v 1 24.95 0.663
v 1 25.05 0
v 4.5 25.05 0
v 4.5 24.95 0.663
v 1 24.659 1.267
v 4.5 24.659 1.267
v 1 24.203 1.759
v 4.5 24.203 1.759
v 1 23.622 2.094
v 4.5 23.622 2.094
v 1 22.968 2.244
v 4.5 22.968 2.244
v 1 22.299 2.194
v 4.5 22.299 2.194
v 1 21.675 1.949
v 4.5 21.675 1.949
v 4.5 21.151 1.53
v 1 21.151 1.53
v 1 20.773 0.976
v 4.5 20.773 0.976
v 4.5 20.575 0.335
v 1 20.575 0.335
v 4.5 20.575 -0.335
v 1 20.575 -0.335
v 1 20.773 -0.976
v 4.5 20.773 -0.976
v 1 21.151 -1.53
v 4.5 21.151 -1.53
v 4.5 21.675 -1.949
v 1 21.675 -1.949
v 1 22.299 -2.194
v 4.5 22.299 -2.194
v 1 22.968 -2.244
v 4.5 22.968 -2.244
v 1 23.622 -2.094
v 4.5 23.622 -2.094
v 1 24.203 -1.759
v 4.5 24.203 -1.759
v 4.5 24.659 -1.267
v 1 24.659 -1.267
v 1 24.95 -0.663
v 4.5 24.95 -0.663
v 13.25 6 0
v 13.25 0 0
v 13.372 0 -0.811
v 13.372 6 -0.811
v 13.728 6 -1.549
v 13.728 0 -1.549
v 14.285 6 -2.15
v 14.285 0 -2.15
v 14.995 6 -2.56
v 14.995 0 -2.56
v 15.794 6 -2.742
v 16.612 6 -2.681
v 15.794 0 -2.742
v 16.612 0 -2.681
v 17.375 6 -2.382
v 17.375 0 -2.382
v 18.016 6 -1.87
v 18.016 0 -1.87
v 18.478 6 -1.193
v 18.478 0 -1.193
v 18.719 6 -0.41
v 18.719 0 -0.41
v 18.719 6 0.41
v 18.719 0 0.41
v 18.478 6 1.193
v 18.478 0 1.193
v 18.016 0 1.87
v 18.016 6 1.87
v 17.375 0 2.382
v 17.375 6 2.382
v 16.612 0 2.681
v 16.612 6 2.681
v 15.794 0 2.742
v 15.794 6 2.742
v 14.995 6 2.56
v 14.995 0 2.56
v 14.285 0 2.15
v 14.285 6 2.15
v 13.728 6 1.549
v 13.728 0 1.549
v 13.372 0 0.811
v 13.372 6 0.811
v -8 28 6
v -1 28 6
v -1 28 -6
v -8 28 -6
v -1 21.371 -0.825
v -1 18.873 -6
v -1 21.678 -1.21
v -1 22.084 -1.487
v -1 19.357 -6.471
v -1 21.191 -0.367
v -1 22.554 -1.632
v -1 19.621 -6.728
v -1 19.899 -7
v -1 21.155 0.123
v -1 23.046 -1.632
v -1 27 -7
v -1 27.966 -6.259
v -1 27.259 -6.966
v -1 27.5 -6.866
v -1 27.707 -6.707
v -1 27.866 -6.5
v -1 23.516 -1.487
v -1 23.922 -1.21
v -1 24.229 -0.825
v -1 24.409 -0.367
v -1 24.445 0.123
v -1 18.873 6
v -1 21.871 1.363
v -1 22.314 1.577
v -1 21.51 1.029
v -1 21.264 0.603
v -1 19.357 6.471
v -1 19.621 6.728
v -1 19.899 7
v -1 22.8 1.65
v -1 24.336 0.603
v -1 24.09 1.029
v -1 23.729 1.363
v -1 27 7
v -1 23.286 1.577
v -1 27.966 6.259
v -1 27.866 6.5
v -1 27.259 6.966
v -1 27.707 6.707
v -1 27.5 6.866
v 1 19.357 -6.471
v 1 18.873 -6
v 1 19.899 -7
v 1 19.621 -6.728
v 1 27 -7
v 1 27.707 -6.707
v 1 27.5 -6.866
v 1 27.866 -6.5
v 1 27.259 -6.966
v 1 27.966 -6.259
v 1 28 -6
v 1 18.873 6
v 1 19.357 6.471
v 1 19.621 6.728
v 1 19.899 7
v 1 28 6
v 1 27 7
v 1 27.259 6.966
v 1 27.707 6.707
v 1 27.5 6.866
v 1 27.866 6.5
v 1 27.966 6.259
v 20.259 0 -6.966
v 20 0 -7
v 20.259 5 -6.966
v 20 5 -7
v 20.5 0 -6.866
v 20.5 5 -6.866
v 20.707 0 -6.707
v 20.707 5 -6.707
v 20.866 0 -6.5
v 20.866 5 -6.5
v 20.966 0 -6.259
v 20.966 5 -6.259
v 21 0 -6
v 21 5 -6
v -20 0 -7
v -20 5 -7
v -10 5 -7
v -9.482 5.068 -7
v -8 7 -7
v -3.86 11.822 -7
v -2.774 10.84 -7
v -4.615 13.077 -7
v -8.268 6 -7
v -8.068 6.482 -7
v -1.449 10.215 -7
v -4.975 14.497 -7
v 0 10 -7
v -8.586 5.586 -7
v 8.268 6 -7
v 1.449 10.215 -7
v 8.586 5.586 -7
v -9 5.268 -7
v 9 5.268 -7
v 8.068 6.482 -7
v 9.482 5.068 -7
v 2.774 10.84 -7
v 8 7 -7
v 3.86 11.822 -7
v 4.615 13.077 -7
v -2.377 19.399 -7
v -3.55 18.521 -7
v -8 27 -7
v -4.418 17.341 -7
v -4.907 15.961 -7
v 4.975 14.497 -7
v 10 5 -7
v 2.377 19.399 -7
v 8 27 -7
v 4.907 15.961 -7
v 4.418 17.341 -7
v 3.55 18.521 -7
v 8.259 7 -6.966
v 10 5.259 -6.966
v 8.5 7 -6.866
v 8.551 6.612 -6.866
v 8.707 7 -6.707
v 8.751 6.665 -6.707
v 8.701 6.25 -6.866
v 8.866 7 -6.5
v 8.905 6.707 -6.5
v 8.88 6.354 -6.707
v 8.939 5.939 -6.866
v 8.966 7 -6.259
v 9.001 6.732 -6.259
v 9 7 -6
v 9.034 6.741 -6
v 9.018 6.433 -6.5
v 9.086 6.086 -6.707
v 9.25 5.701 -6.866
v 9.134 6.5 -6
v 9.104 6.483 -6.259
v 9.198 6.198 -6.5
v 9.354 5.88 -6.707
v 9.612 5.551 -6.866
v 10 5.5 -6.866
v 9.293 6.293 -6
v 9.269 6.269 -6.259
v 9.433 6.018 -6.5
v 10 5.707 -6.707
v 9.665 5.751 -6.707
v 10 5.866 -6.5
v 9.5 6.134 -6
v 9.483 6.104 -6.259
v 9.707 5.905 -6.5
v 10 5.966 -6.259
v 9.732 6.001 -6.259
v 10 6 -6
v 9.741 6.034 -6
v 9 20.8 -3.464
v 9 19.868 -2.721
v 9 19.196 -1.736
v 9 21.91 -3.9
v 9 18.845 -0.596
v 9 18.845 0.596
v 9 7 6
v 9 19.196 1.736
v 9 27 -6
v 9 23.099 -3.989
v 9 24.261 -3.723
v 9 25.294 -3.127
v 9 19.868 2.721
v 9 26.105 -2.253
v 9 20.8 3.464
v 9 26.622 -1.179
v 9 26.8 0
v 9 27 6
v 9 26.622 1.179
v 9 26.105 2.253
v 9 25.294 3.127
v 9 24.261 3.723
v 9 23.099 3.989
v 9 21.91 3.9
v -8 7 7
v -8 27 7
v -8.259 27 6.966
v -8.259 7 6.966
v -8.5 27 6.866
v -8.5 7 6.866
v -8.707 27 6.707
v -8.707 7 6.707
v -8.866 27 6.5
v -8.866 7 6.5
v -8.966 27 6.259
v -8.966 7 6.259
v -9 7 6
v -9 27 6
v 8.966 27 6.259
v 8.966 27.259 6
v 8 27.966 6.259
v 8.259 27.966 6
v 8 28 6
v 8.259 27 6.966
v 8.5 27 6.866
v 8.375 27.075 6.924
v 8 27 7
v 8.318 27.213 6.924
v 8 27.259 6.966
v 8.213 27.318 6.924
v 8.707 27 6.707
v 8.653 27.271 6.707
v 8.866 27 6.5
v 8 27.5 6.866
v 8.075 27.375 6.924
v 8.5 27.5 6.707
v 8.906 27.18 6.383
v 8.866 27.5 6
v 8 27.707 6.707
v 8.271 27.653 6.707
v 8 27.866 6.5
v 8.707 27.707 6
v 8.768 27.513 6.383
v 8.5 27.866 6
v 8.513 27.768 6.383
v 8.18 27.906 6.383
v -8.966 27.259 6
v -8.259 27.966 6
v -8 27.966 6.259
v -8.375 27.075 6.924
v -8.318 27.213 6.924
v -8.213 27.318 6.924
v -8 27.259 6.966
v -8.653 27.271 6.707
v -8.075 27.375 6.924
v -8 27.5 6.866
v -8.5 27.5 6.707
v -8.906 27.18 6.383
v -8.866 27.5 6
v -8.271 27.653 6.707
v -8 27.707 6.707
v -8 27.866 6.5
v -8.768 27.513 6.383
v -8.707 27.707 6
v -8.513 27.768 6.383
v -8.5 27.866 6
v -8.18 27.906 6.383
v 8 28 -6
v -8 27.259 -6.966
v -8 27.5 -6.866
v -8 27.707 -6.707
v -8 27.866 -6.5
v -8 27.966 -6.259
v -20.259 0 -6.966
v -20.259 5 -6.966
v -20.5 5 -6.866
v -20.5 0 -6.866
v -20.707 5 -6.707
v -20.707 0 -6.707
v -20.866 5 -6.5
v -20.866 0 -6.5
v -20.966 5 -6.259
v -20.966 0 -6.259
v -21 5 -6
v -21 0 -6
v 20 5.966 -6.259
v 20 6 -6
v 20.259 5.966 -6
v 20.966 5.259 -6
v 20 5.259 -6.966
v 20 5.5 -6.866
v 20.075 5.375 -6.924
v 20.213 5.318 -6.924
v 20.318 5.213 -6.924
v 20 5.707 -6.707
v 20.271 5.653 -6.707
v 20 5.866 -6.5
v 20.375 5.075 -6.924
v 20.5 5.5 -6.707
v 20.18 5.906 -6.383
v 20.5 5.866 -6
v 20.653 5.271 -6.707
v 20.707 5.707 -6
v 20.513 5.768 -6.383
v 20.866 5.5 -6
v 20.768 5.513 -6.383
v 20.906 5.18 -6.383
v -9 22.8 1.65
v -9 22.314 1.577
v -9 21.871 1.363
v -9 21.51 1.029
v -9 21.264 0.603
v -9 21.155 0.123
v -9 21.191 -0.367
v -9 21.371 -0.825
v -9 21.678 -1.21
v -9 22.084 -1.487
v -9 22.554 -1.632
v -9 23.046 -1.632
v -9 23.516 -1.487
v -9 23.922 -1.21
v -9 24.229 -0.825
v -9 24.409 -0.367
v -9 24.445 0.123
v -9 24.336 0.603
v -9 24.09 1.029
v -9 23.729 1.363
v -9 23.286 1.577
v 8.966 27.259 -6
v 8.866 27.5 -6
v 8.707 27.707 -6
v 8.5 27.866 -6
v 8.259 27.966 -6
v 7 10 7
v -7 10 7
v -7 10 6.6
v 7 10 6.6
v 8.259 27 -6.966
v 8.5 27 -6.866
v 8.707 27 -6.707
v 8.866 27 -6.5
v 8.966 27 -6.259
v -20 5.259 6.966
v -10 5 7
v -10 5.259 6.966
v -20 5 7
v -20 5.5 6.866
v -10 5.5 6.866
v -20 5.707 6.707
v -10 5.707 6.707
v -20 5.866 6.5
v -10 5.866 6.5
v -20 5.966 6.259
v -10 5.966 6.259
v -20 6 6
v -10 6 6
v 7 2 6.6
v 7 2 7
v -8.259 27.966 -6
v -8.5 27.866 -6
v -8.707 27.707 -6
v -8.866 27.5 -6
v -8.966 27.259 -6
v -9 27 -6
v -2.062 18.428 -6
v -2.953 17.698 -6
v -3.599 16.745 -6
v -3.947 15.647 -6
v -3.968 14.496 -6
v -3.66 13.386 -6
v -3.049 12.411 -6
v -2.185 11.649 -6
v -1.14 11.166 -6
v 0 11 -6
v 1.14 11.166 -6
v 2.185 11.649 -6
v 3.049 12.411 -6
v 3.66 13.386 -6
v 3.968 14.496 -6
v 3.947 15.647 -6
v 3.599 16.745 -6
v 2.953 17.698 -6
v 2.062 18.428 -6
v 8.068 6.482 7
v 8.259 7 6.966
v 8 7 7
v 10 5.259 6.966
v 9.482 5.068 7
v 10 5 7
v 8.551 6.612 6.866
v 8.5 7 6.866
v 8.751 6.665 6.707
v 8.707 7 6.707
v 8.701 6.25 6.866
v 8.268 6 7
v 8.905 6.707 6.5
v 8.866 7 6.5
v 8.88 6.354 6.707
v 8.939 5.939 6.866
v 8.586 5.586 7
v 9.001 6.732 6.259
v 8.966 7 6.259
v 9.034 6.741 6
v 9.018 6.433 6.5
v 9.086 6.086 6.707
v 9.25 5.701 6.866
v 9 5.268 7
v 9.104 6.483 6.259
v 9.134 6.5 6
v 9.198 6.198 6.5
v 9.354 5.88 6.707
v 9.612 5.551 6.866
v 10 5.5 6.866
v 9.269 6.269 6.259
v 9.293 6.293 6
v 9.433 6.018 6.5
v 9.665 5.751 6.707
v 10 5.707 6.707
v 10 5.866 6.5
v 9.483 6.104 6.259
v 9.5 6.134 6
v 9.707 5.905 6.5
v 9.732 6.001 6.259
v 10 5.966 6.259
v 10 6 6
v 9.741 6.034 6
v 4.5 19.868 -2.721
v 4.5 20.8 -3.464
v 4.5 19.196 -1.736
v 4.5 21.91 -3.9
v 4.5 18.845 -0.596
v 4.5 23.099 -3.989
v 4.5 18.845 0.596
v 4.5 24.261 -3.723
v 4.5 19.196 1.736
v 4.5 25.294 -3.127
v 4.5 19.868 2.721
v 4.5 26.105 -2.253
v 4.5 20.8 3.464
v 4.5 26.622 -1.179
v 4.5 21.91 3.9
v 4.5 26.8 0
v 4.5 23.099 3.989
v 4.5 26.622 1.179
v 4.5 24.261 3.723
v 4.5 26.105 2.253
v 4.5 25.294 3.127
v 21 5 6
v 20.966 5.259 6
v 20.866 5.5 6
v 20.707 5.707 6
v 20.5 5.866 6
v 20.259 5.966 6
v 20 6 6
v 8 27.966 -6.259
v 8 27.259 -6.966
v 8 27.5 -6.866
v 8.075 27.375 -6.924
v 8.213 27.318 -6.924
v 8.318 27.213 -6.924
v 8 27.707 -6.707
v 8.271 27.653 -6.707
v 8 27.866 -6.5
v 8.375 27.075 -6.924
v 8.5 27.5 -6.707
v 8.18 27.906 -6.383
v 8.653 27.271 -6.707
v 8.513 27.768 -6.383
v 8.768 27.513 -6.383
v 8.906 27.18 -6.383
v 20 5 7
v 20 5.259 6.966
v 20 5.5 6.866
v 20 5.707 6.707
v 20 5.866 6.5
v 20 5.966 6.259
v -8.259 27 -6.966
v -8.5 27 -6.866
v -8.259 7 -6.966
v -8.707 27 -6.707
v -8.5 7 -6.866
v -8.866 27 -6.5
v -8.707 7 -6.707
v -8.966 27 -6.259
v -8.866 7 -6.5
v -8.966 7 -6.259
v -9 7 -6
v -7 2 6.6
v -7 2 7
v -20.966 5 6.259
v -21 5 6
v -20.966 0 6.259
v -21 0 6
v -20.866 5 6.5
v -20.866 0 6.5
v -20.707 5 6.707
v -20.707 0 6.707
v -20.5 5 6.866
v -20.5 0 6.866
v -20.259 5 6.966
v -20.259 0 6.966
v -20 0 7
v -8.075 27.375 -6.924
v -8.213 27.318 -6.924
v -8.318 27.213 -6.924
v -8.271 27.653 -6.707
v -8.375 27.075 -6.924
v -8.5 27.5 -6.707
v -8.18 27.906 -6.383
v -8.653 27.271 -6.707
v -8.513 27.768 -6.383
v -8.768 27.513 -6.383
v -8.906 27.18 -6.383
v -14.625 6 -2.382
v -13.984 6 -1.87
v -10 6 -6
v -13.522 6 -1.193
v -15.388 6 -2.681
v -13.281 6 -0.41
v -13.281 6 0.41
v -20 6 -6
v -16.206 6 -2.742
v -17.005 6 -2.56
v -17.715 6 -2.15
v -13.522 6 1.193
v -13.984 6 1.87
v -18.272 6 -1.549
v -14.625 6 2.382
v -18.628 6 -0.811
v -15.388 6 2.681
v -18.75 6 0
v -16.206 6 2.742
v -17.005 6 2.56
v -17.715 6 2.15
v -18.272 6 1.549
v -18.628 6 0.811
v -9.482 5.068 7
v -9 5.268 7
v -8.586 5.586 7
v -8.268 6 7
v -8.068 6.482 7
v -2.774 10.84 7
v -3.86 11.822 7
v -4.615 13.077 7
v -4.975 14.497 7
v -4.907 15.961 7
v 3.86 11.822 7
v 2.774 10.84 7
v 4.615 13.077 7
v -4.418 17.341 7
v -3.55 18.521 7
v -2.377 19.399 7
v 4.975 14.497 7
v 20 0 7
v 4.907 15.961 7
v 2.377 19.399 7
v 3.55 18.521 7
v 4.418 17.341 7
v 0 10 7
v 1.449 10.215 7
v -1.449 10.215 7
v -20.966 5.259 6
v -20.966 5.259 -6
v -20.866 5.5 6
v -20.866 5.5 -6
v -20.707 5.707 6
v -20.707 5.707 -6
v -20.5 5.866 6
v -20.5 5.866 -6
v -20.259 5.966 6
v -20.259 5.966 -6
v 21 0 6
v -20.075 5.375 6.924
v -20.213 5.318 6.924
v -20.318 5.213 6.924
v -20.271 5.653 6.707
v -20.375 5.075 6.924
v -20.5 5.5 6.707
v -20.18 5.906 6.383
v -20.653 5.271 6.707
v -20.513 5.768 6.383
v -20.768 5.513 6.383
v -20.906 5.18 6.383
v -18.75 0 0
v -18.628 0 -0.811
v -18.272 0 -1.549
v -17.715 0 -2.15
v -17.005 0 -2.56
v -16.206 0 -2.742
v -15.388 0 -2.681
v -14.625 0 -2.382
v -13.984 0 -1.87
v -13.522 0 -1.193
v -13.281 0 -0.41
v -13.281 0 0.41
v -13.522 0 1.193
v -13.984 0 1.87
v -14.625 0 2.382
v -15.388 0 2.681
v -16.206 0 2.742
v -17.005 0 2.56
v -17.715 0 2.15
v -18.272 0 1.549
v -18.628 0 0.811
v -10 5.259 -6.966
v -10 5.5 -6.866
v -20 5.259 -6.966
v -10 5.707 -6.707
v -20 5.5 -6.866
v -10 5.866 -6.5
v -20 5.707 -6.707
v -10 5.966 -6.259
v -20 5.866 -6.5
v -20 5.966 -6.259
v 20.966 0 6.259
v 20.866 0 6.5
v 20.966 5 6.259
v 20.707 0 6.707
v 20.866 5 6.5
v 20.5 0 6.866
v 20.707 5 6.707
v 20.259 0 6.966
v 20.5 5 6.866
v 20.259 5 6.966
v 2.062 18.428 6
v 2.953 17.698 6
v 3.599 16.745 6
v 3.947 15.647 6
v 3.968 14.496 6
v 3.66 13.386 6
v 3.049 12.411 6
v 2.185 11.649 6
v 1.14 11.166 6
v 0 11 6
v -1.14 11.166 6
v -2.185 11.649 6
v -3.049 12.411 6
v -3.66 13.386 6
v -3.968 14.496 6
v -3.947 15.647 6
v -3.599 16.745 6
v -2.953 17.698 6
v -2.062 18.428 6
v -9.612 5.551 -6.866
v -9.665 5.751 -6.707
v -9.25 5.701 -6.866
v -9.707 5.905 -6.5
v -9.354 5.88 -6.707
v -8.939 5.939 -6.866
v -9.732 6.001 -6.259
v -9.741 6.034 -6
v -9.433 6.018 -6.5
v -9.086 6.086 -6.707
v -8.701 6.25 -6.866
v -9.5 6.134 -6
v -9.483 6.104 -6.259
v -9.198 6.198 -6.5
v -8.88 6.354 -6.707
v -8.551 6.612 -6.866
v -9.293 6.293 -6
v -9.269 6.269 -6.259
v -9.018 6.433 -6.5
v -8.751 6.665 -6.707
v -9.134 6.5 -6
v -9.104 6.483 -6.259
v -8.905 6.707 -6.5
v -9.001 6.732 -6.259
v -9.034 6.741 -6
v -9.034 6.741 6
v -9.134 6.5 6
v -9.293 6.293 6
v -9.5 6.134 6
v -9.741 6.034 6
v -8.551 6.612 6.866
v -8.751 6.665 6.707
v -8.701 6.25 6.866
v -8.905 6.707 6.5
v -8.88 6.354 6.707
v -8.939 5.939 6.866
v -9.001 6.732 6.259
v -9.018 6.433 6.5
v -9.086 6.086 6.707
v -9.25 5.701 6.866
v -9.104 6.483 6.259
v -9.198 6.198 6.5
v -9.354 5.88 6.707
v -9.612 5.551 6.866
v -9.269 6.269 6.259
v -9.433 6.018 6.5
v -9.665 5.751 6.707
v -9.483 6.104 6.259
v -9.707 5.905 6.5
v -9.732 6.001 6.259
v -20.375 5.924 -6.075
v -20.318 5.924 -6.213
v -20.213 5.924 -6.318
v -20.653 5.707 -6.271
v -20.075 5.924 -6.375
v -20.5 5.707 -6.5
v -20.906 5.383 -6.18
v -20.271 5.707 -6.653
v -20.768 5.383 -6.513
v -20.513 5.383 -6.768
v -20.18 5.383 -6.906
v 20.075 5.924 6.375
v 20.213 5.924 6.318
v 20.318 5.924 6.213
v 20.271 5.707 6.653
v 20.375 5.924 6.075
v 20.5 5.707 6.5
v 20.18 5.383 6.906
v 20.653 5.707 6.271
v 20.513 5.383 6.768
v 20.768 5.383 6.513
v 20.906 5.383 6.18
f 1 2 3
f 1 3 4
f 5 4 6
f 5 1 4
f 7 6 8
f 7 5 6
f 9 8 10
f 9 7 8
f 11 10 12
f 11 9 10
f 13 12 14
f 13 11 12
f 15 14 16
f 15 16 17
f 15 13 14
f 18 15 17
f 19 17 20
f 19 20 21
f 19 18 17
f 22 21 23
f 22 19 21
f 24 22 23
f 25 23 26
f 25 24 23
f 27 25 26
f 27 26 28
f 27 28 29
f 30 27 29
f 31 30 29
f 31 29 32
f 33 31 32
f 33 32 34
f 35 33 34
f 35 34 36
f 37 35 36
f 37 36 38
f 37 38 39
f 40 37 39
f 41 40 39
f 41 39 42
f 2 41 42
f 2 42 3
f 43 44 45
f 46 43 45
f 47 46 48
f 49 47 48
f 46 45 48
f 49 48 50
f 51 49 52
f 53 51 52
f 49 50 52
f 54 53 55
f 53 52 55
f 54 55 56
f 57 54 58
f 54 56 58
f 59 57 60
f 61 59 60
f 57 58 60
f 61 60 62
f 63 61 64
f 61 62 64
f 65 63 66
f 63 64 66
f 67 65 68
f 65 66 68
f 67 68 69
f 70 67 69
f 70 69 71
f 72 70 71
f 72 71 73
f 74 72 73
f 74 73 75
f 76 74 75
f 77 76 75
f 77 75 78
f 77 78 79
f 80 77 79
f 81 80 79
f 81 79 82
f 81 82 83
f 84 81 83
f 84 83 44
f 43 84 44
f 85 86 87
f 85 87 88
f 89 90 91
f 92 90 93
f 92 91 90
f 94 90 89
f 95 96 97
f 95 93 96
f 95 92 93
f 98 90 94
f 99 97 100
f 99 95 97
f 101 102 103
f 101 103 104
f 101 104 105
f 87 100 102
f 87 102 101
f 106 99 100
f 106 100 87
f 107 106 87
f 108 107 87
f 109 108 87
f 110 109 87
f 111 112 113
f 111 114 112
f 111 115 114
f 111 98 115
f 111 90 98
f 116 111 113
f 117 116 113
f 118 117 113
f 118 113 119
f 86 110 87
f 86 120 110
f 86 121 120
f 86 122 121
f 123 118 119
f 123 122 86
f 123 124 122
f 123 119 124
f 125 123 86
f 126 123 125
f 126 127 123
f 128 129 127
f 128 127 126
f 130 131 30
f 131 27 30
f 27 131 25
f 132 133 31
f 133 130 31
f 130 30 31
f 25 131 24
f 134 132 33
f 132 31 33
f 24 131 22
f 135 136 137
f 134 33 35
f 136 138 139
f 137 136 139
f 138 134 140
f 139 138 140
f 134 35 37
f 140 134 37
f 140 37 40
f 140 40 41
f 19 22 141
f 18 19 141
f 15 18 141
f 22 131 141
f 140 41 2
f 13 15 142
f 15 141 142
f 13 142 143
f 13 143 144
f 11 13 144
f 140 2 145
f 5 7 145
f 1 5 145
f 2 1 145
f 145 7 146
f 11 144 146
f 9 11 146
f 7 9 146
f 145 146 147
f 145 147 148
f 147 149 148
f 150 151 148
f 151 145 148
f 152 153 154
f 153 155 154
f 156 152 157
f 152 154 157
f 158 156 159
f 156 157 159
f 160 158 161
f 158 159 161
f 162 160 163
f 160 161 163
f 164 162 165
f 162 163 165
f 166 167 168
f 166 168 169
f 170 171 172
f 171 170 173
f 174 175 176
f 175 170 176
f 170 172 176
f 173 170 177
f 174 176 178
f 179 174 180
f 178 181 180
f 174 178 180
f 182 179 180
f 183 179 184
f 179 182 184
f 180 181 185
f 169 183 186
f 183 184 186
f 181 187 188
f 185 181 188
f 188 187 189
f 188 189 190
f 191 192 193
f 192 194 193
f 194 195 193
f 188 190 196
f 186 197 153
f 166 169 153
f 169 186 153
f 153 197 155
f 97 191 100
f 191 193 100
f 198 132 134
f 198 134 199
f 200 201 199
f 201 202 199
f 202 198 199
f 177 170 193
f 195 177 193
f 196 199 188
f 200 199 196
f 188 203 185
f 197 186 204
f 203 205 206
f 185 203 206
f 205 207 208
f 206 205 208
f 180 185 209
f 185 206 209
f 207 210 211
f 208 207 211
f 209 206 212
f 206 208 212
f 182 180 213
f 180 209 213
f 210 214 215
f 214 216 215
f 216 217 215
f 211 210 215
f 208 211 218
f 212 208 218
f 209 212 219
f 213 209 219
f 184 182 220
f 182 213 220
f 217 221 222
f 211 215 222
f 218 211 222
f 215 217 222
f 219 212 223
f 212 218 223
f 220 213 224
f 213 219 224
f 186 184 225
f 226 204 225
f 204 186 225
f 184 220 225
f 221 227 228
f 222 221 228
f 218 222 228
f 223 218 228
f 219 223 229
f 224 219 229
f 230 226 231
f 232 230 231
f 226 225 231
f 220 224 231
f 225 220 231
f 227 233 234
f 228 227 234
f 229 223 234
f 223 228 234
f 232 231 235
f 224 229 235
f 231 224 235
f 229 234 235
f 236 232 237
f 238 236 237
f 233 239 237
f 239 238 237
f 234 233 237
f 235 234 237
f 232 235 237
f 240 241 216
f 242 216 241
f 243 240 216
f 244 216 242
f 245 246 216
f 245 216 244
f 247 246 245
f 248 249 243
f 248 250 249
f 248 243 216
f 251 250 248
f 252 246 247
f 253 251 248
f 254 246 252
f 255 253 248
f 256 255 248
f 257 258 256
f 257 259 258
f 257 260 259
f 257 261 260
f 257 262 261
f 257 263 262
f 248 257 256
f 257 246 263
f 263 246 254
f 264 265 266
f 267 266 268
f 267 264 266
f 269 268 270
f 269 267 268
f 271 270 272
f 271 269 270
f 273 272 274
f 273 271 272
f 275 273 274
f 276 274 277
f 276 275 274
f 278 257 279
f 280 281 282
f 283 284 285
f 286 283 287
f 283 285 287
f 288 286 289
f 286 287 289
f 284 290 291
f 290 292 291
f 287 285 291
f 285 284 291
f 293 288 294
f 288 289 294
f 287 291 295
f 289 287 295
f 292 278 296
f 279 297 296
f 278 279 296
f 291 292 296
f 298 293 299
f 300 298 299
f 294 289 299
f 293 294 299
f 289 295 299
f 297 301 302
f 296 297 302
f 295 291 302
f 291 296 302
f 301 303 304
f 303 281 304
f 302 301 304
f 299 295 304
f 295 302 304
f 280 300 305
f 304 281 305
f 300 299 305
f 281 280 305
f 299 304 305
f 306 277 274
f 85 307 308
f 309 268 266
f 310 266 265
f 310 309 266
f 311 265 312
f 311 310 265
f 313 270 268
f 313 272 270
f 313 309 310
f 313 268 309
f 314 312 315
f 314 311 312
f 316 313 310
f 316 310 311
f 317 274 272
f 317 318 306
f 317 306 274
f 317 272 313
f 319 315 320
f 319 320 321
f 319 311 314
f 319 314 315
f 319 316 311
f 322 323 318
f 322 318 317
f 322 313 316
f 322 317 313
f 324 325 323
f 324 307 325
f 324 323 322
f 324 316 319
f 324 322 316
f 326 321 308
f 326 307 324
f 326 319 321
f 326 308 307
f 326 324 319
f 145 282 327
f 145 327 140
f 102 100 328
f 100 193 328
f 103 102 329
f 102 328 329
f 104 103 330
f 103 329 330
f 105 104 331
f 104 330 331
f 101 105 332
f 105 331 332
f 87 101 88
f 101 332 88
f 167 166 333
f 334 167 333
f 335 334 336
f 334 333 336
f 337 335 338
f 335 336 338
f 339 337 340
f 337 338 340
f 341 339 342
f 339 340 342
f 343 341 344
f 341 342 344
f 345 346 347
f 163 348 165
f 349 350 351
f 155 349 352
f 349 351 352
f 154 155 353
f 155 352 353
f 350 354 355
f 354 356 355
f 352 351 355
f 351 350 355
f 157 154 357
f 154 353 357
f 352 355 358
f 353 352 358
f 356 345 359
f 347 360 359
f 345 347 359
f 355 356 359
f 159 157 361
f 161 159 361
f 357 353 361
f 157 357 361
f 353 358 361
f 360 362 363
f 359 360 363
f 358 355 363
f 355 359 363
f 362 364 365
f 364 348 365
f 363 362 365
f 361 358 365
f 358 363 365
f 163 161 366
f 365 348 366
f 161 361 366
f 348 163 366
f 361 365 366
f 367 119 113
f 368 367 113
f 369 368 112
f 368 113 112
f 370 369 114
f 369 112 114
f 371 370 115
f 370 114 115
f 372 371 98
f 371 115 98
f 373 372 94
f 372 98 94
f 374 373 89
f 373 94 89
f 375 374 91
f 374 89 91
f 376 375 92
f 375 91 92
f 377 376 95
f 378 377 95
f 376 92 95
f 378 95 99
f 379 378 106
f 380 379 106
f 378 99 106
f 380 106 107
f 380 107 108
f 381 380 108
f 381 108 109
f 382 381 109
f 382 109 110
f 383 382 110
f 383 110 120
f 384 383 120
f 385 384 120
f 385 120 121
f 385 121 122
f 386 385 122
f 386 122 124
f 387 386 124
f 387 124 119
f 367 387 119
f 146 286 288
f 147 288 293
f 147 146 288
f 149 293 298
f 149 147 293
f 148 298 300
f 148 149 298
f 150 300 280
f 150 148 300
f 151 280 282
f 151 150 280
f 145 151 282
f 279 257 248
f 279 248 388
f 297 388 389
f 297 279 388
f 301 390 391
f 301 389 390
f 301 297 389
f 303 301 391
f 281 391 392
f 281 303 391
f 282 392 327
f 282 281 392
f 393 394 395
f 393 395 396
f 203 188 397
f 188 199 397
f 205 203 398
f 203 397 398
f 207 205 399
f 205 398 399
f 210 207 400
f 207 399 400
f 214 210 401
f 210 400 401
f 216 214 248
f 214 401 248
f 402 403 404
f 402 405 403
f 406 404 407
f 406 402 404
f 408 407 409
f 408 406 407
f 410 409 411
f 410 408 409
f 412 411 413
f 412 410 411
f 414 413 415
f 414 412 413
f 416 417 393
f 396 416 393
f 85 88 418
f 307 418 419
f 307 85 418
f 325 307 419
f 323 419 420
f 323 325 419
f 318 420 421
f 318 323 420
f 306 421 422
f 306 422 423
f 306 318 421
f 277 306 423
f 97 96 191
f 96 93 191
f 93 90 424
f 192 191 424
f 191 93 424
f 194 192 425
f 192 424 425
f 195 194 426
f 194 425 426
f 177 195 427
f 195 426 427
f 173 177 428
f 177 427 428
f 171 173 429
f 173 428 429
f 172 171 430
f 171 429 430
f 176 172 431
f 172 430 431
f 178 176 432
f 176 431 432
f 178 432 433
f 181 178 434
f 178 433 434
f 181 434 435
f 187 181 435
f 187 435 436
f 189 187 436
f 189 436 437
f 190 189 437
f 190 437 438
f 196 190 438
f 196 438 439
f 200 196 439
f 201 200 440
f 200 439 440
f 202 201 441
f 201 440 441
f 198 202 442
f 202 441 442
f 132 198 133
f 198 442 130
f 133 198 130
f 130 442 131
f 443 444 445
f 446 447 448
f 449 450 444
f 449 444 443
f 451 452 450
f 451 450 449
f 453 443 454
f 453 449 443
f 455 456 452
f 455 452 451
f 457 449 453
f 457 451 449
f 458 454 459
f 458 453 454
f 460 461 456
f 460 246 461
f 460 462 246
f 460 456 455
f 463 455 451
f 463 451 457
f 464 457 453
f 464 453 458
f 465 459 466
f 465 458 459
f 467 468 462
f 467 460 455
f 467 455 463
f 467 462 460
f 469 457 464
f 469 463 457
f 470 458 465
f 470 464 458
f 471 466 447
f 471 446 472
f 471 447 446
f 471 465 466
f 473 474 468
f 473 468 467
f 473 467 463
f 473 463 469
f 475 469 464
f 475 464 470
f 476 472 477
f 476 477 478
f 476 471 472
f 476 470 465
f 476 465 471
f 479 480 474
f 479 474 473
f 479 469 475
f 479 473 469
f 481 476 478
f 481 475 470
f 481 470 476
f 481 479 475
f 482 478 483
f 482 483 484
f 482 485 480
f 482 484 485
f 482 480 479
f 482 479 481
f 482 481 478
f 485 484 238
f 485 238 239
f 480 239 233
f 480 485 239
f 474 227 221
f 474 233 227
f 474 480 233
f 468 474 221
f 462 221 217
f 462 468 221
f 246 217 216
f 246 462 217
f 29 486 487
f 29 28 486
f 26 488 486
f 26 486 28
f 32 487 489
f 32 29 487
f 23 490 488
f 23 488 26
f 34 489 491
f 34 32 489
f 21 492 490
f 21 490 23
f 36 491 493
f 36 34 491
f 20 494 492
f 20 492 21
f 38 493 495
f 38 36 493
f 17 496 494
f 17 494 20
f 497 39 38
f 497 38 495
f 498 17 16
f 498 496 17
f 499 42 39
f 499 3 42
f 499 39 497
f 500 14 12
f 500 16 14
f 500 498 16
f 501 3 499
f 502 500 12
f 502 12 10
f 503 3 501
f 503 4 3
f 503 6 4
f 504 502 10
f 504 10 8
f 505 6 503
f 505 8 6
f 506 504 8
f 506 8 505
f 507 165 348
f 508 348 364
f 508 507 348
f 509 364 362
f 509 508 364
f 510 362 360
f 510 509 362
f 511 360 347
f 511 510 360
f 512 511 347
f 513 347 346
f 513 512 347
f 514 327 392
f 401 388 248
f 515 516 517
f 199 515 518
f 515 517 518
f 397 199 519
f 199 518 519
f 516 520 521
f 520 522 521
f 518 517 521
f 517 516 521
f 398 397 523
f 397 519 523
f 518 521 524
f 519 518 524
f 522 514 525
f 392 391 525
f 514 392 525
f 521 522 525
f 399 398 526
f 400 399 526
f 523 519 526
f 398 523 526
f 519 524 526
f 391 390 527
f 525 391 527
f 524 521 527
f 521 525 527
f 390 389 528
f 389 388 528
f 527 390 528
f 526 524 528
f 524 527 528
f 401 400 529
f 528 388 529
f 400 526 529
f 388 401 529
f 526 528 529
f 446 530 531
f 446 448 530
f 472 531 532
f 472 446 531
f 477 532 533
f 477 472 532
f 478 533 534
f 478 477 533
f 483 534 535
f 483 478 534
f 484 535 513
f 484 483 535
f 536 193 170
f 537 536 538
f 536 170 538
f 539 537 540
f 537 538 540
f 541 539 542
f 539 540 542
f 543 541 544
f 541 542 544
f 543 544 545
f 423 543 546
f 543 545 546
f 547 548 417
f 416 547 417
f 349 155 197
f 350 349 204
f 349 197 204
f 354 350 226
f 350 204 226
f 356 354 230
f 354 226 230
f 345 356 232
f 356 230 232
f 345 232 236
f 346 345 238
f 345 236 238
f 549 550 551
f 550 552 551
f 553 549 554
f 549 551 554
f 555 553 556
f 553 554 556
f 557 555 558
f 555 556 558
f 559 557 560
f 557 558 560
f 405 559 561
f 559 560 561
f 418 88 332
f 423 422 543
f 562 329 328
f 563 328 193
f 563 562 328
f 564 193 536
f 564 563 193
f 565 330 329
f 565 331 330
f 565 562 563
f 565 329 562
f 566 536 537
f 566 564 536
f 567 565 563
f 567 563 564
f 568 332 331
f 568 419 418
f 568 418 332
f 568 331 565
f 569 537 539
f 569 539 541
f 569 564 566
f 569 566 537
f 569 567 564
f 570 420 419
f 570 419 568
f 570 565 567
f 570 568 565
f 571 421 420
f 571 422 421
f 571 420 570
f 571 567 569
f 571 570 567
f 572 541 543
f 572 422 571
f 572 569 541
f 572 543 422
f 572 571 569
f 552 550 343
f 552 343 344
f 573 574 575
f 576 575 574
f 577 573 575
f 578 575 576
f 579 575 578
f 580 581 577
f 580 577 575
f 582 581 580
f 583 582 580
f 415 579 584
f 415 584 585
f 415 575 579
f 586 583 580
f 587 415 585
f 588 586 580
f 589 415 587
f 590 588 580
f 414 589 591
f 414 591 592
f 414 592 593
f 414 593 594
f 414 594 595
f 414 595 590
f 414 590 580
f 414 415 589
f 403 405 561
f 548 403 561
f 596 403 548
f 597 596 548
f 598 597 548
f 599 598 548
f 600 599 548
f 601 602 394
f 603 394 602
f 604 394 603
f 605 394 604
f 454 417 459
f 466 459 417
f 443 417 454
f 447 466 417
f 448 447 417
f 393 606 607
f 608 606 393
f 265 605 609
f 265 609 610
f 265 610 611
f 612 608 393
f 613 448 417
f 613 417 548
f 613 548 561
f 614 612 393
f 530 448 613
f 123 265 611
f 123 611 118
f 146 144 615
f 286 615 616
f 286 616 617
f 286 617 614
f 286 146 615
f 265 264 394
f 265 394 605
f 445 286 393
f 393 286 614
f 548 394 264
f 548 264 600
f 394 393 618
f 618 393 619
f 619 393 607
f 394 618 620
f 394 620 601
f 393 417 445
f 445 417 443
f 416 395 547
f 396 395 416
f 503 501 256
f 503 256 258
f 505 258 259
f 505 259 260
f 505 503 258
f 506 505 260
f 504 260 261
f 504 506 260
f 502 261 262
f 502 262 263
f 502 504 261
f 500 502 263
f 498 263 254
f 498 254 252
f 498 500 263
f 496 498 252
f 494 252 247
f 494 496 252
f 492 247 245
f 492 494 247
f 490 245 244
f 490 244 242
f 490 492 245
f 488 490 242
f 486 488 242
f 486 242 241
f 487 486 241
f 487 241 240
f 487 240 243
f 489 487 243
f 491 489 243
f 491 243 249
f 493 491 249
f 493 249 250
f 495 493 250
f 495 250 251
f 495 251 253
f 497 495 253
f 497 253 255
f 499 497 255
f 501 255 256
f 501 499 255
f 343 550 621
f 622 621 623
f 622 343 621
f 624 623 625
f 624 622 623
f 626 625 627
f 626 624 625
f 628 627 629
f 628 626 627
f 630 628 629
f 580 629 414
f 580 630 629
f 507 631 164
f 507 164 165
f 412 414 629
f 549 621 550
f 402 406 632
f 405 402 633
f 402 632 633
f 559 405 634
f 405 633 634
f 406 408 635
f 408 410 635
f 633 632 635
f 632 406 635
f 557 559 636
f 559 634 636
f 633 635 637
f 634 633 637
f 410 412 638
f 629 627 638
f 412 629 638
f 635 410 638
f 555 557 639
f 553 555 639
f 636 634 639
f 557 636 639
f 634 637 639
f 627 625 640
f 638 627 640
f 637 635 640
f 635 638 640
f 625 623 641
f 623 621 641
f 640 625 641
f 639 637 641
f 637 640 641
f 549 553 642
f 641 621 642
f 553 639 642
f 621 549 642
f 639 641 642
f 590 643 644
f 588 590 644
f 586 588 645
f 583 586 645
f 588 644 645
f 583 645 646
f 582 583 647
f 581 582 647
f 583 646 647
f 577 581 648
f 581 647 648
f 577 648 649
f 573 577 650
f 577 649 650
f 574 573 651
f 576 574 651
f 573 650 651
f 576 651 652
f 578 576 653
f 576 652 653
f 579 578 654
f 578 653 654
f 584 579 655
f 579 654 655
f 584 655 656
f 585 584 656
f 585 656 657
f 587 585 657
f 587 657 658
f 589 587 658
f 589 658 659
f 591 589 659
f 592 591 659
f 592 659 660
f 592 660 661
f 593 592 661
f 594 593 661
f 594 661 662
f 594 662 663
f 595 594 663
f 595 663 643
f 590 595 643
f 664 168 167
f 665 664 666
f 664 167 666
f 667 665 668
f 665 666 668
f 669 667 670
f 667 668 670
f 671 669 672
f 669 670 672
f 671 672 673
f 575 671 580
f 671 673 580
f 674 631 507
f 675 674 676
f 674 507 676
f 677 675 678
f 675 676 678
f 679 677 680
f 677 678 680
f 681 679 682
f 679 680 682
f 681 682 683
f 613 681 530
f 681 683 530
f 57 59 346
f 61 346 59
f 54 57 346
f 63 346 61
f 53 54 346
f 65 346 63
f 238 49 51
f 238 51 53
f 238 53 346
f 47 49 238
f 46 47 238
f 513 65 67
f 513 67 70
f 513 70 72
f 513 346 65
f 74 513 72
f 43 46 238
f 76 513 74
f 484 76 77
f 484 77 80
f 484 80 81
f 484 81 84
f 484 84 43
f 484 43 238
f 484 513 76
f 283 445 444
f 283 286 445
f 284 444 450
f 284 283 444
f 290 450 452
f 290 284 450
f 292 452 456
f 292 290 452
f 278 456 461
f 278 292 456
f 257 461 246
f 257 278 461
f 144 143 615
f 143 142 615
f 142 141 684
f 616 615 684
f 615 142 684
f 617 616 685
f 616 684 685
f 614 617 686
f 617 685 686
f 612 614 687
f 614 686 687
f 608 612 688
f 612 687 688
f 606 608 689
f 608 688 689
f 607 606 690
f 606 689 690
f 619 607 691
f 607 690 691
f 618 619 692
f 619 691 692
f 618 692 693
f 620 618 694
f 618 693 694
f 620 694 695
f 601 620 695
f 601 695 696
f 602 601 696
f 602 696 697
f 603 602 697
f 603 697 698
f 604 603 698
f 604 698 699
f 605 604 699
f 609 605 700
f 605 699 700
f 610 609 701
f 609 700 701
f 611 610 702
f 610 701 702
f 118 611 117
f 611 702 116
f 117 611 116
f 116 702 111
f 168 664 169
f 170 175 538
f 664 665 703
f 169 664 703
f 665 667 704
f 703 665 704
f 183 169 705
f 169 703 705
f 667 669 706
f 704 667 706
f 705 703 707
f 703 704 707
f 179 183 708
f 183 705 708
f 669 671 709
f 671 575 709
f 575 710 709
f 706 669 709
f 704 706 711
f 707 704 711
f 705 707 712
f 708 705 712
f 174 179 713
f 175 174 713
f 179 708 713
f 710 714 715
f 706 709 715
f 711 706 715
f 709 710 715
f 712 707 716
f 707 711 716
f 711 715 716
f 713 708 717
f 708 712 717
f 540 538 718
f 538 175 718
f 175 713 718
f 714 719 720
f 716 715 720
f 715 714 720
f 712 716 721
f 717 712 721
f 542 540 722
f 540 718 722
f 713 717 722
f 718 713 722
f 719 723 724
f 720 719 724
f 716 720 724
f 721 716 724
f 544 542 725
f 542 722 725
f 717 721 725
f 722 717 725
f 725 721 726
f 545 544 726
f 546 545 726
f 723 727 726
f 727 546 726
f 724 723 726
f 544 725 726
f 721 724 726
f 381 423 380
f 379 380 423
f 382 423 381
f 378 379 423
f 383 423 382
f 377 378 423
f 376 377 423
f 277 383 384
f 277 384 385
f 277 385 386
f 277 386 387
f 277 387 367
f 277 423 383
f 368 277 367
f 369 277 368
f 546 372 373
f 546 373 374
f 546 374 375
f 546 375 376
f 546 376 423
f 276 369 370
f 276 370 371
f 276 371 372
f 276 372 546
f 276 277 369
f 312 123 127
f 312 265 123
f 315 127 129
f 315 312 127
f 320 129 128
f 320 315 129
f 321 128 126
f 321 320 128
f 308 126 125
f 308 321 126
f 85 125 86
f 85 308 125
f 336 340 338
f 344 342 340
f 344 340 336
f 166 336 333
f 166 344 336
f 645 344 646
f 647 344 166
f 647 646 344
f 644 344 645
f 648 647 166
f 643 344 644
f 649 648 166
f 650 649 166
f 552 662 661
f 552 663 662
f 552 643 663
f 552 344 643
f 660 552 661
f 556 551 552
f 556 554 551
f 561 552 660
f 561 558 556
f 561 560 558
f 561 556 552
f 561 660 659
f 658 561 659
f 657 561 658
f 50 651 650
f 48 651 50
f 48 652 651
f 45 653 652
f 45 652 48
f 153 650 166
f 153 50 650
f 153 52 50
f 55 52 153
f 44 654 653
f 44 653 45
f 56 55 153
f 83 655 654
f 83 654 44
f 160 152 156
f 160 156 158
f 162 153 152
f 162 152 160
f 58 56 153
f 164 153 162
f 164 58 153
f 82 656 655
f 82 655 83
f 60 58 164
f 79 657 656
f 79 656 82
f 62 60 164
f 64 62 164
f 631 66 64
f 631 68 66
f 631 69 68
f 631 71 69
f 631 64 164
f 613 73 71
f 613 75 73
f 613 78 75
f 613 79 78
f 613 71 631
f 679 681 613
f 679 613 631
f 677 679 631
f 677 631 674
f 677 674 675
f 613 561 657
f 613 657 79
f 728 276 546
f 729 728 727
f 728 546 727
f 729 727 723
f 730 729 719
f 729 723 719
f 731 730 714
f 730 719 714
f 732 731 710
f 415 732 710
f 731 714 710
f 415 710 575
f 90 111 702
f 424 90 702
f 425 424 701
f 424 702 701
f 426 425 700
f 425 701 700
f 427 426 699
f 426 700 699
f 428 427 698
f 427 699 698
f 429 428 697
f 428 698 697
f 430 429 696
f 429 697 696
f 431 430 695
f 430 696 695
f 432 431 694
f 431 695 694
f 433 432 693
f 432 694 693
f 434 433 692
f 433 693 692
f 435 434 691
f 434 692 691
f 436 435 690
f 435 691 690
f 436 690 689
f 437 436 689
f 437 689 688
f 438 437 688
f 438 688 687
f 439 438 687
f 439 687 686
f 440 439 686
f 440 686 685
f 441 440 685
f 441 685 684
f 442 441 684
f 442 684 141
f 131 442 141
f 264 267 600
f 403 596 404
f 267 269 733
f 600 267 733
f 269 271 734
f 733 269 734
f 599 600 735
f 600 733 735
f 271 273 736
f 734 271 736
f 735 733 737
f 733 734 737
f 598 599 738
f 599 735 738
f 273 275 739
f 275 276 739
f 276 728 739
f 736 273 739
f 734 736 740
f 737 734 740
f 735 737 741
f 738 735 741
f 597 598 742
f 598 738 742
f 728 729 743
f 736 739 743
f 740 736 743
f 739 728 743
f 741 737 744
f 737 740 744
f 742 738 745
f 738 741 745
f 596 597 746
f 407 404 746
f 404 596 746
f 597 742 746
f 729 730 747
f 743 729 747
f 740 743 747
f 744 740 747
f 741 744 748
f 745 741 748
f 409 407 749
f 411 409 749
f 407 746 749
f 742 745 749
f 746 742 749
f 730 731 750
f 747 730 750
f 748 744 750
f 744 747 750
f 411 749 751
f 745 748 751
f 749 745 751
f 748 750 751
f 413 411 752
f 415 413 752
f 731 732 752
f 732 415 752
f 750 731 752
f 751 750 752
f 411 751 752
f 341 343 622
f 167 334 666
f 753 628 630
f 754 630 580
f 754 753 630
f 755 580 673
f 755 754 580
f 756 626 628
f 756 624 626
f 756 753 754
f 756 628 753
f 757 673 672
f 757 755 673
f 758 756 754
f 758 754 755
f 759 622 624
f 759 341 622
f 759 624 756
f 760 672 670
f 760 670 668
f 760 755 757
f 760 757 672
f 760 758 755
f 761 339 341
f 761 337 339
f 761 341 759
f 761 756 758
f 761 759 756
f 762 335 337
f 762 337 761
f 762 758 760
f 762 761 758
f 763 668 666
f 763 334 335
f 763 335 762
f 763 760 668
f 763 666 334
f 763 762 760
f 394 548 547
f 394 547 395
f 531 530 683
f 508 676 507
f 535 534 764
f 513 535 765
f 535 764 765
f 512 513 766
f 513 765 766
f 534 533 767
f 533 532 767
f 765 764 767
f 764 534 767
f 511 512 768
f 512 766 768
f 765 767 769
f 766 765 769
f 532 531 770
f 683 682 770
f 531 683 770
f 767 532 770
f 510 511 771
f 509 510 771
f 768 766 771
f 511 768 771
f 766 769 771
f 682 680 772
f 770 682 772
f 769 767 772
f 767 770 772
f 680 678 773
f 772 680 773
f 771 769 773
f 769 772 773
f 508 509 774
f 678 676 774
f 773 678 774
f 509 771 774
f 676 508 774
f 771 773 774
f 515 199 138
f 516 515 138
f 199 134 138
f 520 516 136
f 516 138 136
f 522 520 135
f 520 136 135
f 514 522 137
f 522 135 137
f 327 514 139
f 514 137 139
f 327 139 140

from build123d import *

# Parameters (mm, degrees)
BOSS_EXTRUDE1_DEPTH                        = 7
CUT_EXTRUDE1_REACH                         = 39.696
SKETCH2_R                                  = 4
DIAMETER_HOLE1_D                           = 5.5
CBORE_START                                = 4.5
CBORE_FOR_SOCKET_HEAD_CAP_SCREW1_OUTLINE_R = 4
CBORE_FOR_SOCKET_HEAD_CAP_SCREW1_DEPTH     = 4.5
CBORE_FOR_SOCKET_HEAD_CAP_SCREW1_2_OUTLI_R = 2.25
CBORE_FOR_SOCKET_HEAD_CAP_SCREW1_2_DEPTH   = 4.5
TAPPED_HOLE1_D                             = 3.3
CUT_EXTRUDE2_REACH                         = 39.696
SKETCH9_W                                  = 2
SKETCH9_H                                  = 13
SKETCH10_W                                 = 14
SKETCH10_H                                 = 8
CUT_EXTRUDE3_DEPTH                         = 0.4
FILLET1_R                                  = 1
CHAMFER1_SIZE                              = 1


# Read off the part's stored shape, not the designer's step: CBORE for Socket Head Cap Screw1
with BuildPart() as part:
    # Sketch1 → Boss-Extrude1 (new, symmetric)
    with BuildSketch(Plane.XY):
        Polygon((-21, 0), (21, 0), (21, 6), (9, 6), (9, 28), (-9, 28), (-9, 6), (-21, 6), align=None)
    extrude(amount=BOSS_EXTRUDE1_DEPTH, both=True)

    # Sketch2 → Cut-Extrude1 (cut, up to next)
    with BuildSketch(Plane.XY.offset(7), mode=Mode.PRIVATE) as cut_extrude1_sk1:
        with Locations((0, 15)):
            Circle(SKETCH2_R)
    cut_extrude1_tool1 = extrude(cut_extrude1_sk1.sketch, amount=-CUT_EXTRUDE1_REACH, mode=Mode.PRIVATE) & part.part
    add(cut_extrude1_tool1.solids().sort_by_distance((0, 15, 7))[0], mode=Mode.SUBTRACT)

    # Diameter Hole1 (through all)
    with Locations(Plane(origin=(0, 6, 0), x_dir=(1, 0, 0), z_dir=(0, 1, 0))):
        with Locations((-16, 0), (16, 0)):
            Hole(DIAMETER_HOLE1_D / 2)

    # CBORE for Socket Head Cap Screw1 outline → CBORE for Socket Head Cap Screw1 (cut)
    with BuildSketch(Plane.YZ.offset(CBORE_START)):
        with Locations((22.8, 0)):
            Circle(CBORE_FOR_SOCKET_HEAD_CAP_SCREW1_OUTLINE_R)
    extrude(amount=CBORE_FOR_SOCKET_HEAD_CAP_SCREW1_DEPTH, mode=Mode.SUBTRACT)

    # CBORE for Socket Head Cap Screw1 2 outli → CBORE for Socket Head Cap Screw1 2 (cut)
    with BuildSketch(Plane.YZ):
        with Locations((22.8, 0)):
            Circle(CBORE_FOR_SOCKET_HEAD_CAP_SCREW1_2_OUTLI_R)
    extrude(amount=CBORE_FOR_SOCKET_HEAD_CAP_SCREW1_2_DEPTH, mode=Mode.SUBTRACT)

    # Tapped Hole1 (through all)
    with Locations(Plane(origin=(-9, -2.558166827, -1.433608379), x_dir=(0, 0, -1), z_dir=(-1, 0, 0))):
        with Locations((-1.433608379, -25.358166827)):
            Hole(TAPPED_HOLE1_D / 2)

    # Sketch9 → Cut-Extrude2 (cut, up to next)
    with BuildSketch(Plane.XY.offset(7), mode=Mode.PRIVATE) as cut_extrude2_sk1:
        with Locations((0, 21.5)):
            Rectangle(SKETCH9_W, SKETCH9_H)
    cut_extrude2_tool1 = extrude(cut_extrude2_sk1.sketch, amount=-CUT_EXTRUDE2_REACH, mode=Mode.PRIVATE) & part.part
    add(cut_extrude2_tool1.solids().sort_by_distance((0, 21.5, 7))[0], mode=Mode.SUBTRACT)

    # Sketch10 → Cut-Extrude3 (cut)
    with BuildSketch(Plane.XY.offset(7)):
        with Locations((0, 6)):
            Rectangle(SKETCH10_W, SKETCH10_H)
    extrude(amount=-CUT_EXTRUDE3_DEPTH, mode=Mode.SUBTRACT)

    # Fillet1
    fillet1_edges = [part.edges().sort_by_distance(p)[0] for p in [
        (21, 3, 7),
        (-21, 3, -7),
        (15, 6, 7),
        (-21, 6, 0),
        (-9, 6, 0),
        (-9, 28, 0),
        (9, 28, 0),
        (9, 6, 0),
        (21, 6, 0),
        (9, 17, 7),
        (5, 28, 7),
        (-9, 17, 7),
        (-15, 6, 7),
        (-21, 3, 7),
        (-5, 28, -7),
        (-5, 28, 7),
        (-15, 6, -7),
        (-9, 17, -7),
        (5, 28, -7),
        (9, 17, -7),
        (15, 6, -7),
        (21, 3, -7),
    ]]
    fillet(fillet1_edges, radius=FILLET1_R)

    # Chamfer1
    chamfer1_edges = [part.edges().sort_by_distance(p)[0] for p in [
        (0, 11, 7),
        (0, 11, -7),
    ]]
    chamfer(chamfer1_edges, length=CHAMFER1_SIZE - 0.0001)  # a hair under: the kernel refuses the full size


solid = part.part
